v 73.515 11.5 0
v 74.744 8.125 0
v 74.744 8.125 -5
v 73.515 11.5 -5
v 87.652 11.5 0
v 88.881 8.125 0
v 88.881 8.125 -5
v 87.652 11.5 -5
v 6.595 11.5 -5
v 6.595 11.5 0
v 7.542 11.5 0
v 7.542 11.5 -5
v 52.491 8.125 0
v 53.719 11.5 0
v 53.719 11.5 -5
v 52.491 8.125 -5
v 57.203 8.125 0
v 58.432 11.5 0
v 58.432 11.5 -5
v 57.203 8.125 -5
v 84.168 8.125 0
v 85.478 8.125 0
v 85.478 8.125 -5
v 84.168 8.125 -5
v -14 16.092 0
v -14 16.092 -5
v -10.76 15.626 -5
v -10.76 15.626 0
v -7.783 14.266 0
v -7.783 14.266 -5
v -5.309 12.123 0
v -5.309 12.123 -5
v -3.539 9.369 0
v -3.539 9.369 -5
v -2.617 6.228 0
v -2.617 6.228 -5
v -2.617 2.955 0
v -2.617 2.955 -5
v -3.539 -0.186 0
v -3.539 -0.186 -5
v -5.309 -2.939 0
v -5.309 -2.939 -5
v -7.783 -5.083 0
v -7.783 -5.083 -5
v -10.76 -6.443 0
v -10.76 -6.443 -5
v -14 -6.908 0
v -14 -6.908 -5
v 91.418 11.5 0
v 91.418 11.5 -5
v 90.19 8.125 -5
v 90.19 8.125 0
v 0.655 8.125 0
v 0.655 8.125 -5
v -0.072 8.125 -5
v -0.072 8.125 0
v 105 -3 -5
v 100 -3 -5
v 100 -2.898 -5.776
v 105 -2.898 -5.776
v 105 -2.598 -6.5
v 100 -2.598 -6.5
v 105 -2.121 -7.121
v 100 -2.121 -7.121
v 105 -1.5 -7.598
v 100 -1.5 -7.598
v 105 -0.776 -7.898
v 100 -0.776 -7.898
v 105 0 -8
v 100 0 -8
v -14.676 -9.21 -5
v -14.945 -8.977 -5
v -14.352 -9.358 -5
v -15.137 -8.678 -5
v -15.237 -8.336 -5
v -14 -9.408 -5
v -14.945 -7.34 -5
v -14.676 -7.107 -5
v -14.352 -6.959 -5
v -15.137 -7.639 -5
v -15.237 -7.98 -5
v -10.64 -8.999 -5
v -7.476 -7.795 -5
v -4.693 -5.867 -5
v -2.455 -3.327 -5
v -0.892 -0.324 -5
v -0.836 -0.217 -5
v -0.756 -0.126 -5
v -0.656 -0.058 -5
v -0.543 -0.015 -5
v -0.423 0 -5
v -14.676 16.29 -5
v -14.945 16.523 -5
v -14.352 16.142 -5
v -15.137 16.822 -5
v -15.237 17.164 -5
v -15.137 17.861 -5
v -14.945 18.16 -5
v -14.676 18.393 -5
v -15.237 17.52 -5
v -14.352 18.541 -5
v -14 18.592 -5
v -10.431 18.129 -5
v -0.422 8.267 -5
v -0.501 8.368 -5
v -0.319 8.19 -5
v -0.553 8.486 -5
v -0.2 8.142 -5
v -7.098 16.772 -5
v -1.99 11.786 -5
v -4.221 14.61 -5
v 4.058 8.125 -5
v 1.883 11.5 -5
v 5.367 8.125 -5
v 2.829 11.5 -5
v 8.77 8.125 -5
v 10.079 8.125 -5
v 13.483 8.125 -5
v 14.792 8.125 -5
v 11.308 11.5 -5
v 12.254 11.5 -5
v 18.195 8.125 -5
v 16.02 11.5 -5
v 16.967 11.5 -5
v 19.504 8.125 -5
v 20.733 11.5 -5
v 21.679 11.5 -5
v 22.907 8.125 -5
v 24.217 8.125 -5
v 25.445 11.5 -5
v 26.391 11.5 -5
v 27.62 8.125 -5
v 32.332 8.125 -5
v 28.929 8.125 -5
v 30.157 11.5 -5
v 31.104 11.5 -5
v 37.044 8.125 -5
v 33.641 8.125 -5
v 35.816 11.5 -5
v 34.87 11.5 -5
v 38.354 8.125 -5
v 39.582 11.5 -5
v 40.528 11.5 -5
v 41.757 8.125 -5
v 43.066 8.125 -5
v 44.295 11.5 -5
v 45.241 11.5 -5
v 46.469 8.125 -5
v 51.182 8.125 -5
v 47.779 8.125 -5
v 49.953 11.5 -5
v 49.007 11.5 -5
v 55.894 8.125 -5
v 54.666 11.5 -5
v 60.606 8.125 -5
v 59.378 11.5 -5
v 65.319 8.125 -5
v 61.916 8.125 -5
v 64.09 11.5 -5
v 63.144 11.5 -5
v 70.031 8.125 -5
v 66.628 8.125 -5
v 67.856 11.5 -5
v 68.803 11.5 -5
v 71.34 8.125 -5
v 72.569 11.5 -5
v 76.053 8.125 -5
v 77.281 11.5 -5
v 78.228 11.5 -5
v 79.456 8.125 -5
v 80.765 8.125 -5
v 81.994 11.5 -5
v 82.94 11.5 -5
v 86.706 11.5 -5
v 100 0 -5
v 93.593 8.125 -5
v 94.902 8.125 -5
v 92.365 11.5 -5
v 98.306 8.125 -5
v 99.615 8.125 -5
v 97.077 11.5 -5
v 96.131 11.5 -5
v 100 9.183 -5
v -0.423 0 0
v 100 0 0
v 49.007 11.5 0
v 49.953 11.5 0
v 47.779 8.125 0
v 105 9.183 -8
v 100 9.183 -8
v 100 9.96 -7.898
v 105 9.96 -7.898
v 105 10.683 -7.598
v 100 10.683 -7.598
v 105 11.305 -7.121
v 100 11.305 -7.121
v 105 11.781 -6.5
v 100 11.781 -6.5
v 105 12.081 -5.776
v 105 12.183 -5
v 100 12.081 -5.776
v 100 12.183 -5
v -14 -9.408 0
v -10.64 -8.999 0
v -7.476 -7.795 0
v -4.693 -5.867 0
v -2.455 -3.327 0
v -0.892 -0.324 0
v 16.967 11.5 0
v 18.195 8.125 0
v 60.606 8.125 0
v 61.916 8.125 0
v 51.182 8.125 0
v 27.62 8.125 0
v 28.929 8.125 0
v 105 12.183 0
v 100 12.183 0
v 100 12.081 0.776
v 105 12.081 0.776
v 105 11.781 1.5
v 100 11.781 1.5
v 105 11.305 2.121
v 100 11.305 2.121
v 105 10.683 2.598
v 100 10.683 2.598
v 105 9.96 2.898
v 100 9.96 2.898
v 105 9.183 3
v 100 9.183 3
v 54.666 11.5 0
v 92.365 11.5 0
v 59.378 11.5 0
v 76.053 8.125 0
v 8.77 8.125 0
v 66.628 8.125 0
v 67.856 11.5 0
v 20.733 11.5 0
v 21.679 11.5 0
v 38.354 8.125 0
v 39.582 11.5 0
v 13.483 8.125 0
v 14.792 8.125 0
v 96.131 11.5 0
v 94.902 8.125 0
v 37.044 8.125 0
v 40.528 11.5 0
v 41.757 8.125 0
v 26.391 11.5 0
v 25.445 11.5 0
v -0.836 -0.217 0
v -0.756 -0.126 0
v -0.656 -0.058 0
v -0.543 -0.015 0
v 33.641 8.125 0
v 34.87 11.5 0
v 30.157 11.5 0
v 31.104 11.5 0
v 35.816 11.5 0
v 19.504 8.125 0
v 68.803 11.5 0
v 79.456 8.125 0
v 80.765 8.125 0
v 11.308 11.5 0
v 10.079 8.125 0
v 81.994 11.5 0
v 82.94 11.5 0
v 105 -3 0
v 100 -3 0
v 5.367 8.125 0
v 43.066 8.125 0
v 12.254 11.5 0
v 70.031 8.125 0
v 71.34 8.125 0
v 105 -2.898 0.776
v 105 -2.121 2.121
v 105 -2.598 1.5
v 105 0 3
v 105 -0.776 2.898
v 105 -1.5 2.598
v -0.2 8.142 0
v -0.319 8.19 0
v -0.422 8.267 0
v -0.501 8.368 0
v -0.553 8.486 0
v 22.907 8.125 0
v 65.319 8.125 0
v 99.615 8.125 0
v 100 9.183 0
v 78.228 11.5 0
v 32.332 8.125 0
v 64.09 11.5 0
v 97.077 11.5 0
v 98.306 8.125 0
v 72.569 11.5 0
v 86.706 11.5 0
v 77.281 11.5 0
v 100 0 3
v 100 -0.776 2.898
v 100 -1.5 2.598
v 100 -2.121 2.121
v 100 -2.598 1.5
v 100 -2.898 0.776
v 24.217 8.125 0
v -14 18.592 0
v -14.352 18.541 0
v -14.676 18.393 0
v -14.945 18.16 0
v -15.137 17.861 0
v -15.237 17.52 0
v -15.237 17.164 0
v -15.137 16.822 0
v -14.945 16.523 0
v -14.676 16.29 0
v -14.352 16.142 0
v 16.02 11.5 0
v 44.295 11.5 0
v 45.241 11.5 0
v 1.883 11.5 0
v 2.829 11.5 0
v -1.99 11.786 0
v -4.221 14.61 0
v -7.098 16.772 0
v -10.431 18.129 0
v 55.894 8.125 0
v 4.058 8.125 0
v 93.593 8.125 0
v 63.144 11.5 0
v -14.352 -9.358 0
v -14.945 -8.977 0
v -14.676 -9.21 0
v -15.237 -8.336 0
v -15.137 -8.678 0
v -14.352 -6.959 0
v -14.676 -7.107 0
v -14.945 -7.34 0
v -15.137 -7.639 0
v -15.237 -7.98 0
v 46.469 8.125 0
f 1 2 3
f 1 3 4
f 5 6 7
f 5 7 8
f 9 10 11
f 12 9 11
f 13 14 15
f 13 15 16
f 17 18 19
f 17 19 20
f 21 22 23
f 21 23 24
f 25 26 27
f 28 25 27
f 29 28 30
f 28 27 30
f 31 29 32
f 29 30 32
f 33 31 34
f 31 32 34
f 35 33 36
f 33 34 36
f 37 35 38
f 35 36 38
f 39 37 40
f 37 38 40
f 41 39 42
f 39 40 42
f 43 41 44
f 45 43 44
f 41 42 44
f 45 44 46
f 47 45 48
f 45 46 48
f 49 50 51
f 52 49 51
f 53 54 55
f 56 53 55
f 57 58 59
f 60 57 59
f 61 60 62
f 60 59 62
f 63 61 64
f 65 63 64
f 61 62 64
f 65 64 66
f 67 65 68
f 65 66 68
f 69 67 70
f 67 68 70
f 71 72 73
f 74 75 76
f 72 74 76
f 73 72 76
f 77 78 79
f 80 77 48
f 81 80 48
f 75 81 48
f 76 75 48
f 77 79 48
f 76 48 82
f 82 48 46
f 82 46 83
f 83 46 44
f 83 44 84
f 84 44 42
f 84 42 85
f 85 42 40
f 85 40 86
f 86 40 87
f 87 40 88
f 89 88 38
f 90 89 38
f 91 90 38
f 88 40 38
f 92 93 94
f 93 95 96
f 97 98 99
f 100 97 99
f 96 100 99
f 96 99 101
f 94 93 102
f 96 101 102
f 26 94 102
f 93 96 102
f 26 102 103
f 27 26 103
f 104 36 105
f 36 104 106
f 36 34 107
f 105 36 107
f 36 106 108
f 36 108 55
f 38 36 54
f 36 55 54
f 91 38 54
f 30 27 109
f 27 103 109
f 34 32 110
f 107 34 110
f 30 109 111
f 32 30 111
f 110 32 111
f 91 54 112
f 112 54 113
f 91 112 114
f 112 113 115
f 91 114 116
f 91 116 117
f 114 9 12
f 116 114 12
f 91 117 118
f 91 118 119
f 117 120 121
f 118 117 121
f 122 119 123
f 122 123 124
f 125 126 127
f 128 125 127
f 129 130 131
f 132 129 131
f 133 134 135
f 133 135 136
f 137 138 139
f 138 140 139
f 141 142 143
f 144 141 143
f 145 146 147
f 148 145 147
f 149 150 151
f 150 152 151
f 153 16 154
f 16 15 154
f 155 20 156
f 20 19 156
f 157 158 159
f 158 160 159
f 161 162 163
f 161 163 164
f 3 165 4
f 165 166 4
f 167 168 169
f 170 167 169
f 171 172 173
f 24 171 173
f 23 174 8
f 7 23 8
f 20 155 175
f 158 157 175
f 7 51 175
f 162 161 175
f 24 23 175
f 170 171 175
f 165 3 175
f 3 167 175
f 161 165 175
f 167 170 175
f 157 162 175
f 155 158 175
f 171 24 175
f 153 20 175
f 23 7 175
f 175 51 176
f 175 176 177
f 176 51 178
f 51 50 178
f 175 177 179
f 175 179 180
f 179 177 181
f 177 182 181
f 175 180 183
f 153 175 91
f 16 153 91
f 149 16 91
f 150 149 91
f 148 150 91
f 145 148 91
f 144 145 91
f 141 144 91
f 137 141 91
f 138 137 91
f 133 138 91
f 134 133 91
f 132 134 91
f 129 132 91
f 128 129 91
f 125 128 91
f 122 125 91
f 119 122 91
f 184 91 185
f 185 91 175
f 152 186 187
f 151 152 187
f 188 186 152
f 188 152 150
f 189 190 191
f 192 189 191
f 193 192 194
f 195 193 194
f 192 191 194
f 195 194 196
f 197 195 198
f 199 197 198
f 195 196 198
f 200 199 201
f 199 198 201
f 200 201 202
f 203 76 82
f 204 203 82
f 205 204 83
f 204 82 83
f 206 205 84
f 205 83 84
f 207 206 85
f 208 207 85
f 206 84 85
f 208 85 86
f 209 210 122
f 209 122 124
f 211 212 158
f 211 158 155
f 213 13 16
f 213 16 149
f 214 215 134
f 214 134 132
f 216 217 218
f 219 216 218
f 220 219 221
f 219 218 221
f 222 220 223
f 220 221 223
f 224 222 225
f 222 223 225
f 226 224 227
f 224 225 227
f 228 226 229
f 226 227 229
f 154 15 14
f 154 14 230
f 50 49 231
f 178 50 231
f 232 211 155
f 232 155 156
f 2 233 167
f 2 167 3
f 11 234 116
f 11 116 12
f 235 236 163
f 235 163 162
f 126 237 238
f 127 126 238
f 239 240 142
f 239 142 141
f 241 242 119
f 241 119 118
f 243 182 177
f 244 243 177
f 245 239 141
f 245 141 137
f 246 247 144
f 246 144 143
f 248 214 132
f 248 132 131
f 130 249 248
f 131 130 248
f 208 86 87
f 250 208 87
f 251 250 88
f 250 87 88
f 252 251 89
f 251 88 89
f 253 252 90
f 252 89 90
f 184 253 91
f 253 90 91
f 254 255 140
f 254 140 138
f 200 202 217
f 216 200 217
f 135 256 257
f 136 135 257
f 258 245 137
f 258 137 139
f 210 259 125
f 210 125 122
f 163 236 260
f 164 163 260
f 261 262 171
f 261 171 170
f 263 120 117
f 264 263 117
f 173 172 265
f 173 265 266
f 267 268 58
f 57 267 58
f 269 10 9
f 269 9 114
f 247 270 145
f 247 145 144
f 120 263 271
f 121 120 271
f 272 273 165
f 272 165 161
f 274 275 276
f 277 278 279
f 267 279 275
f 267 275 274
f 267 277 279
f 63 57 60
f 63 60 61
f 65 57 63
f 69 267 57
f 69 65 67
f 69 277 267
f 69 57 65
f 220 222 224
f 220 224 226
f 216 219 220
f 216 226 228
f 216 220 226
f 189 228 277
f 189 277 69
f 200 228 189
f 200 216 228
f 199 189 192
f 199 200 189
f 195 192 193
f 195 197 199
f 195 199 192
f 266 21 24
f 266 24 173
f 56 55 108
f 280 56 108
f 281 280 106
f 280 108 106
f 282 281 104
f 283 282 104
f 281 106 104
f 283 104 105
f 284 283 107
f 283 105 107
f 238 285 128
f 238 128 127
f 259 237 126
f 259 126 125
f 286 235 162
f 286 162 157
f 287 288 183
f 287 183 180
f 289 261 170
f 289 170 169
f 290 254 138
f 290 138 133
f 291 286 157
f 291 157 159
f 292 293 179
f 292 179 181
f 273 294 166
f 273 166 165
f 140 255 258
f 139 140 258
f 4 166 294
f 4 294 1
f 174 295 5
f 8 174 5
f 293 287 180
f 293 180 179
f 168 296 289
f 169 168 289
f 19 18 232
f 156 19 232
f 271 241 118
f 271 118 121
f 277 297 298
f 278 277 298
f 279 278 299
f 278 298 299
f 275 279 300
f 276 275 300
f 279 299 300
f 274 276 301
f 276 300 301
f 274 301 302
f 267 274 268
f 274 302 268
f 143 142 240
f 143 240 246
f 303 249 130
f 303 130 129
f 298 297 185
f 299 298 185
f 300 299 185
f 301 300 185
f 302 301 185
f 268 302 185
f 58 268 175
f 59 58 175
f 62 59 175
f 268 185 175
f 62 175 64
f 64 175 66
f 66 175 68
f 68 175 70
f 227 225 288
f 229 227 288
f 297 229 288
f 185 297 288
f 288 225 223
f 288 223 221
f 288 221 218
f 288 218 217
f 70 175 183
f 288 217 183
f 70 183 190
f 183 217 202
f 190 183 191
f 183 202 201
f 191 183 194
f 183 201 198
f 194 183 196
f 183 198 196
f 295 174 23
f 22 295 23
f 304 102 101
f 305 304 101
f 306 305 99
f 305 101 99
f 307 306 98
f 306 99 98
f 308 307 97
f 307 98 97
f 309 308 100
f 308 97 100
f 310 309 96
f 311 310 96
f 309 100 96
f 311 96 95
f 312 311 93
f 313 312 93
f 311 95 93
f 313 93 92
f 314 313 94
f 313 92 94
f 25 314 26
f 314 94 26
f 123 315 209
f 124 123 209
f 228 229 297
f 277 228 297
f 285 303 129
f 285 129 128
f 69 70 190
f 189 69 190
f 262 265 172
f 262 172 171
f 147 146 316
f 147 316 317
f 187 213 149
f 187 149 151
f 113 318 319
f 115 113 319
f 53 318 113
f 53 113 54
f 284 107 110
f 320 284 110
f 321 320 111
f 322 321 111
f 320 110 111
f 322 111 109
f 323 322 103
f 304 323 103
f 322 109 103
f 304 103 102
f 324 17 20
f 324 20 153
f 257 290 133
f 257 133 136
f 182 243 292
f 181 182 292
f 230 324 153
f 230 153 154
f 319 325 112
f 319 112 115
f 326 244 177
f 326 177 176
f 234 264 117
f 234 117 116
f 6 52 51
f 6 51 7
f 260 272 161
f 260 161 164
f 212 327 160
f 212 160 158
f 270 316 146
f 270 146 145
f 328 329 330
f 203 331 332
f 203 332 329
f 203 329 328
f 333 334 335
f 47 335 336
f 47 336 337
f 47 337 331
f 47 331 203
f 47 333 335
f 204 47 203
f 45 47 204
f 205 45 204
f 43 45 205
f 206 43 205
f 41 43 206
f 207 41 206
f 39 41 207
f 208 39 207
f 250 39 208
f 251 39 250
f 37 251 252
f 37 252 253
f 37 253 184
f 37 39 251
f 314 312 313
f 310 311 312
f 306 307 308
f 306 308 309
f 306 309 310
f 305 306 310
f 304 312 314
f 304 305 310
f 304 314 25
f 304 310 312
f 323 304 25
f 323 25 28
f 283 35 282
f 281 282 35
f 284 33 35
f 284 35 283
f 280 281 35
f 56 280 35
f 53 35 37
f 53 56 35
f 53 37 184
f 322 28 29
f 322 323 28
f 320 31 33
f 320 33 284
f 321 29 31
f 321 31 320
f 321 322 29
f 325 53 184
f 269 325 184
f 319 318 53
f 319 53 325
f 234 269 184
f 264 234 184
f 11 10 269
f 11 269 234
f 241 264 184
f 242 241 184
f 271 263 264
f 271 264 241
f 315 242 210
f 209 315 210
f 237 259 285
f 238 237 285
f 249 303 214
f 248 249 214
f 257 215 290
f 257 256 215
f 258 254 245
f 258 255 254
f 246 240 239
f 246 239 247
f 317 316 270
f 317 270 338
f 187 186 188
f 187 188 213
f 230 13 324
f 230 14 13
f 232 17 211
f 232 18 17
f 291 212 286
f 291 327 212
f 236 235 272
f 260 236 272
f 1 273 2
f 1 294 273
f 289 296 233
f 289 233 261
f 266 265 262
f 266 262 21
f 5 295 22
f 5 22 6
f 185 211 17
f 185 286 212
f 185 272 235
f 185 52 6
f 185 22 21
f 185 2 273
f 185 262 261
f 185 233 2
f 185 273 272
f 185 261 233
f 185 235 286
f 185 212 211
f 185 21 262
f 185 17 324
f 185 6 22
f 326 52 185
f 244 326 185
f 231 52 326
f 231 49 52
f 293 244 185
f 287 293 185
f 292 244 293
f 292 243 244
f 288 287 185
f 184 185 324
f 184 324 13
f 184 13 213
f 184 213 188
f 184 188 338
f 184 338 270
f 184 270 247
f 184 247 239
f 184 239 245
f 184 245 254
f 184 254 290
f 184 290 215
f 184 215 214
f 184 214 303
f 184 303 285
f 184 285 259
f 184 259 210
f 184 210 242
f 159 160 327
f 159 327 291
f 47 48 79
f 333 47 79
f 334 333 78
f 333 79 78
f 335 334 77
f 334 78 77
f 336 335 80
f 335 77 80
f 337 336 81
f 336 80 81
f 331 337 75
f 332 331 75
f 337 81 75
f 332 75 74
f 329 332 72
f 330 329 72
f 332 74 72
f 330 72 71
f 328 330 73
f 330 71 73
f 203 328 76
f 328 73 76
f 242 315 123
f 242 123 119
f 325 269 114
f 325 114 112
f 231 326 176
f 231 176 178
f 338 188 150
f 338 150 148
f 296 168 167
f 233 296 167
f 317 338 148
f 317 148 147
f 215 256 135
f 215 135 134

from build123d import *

# Parameters (mm, degrees)
BLANKSKE_W         = 100
BLANKSKE_H         = 11.5
BLANK_DEPTH        = 5
TOOTHCUTSIM_DEPTH  = 101.783183121
TEETHCUTS_COUNT    = 22
TEETHCUTS_PITCH    = 4.712388975
BOSS_EXTRU_1_DEPTH = 5
BOSS_EXTRU_2_DEPTH = 5


with BuildPart() as part:
    # BlankSke → Blank (new body)
    with BuildSketch(Plane.XY):
        with Locations((50, 5.75)):
            Rectangle(BLANKSKE_W, BLANKSKE_H)
    extrude(amount=-BLANK_DEPTH)

    # TooCutSkeSim → ToothCutSim (cut, through all)
    with BuildSketch(Plane.XY):
        Polygon((0.654653055, 8.125), (-0.654653055, 8.125), (-1.892297439, 11.5254), (1.892297439, 11.5254), align=None)
    toothcutsim = extrude(amount=-TOOTHCUTSIM_DEPTH, mode=Mode.SUBTRACT)

    # TeethCuts: ToothCutSim ×22
    with Locations(*[(i * TEETHCUTS_PITCH, 0, 0) for i in range(1, TEETHCUTS_COUNT)]):
        add(toothcutsim, mode=Mode.SUBTRACT)

    # Esquisse1 → Boss.-Extru.1 (add)
    with BuildSketch(Plane(origin=(100, 0, 0), x_dir=(0, 0, -1), z_dir=(1, 0, 0))):
        with BuildLine():
            Line((5, 12.18326915), (0, 12.18326915))
            ThreePointArc((0, 12.18326915), (-2.121320344, 11.304589494), (-3, 9.18326915))
            Line((-3, 9.18326915), (-3, 0))
            ThreePointArc((-3, 0), (-2.121320344, -2.121320344), (0, -3))
            Line((0, -3), (5, -3))
            ThreePointArc((5, -3), (7.121320344, -2.121320344), (8, 0))
            Line((8, 0), (8, 9.18326915))
            ThreePointArc((8, 9.18326915), (7.121320344, 11.304589494), (5, 12.18326915))
        make_face()
    extrude(amount=BOSS_EXTRU_1_DEPTH)

    # Esquisse2 → Boss.-Extru.2 (add)
    with BuildSketch(Plane(origin=(0, 0, -5), x_dir=(-1, 0, 0), z_dir=(0, 0, -1))):
        with BuildLine():
            Line((0, 8.125), (0.072259216, 8.125))
            ThreePointArc((0.072259216, 8.125), (0.372641653, 8.225287114), (0.552526139, 8.485918434))
            ThreePointArc((0.552526139, 8.485918434), (5.589291766, 15.783595396), (14, 18.591634575))
            ThreePointArc((14, 18.591634575), (15.25, 17.341634575), (14, 16.091634575))
            ThreePointArc((14, 16.091634575), (2.5, 4.591634575), (14, -6.908365425))
            ThreePointArc((14, -6.908365425), (15.25, -8.158365425), (14, -9.408365425))
            ThreePointArc((14, -9.408365425), (6.025818336, -6.915425292), (0.891516314, -0.324426394))
            ThreePointArc((0.891516314, -0.324426394), (0.708148385, -0.089033576), (0.423356182, 0))
            Line((0.423356182, 0), (0, 0))
            Line((0, 0), (0, 8.125))
        make_face()
    extrude(amount=-BOSS_EXTRU_2_DEPTH)


solid = part.part
